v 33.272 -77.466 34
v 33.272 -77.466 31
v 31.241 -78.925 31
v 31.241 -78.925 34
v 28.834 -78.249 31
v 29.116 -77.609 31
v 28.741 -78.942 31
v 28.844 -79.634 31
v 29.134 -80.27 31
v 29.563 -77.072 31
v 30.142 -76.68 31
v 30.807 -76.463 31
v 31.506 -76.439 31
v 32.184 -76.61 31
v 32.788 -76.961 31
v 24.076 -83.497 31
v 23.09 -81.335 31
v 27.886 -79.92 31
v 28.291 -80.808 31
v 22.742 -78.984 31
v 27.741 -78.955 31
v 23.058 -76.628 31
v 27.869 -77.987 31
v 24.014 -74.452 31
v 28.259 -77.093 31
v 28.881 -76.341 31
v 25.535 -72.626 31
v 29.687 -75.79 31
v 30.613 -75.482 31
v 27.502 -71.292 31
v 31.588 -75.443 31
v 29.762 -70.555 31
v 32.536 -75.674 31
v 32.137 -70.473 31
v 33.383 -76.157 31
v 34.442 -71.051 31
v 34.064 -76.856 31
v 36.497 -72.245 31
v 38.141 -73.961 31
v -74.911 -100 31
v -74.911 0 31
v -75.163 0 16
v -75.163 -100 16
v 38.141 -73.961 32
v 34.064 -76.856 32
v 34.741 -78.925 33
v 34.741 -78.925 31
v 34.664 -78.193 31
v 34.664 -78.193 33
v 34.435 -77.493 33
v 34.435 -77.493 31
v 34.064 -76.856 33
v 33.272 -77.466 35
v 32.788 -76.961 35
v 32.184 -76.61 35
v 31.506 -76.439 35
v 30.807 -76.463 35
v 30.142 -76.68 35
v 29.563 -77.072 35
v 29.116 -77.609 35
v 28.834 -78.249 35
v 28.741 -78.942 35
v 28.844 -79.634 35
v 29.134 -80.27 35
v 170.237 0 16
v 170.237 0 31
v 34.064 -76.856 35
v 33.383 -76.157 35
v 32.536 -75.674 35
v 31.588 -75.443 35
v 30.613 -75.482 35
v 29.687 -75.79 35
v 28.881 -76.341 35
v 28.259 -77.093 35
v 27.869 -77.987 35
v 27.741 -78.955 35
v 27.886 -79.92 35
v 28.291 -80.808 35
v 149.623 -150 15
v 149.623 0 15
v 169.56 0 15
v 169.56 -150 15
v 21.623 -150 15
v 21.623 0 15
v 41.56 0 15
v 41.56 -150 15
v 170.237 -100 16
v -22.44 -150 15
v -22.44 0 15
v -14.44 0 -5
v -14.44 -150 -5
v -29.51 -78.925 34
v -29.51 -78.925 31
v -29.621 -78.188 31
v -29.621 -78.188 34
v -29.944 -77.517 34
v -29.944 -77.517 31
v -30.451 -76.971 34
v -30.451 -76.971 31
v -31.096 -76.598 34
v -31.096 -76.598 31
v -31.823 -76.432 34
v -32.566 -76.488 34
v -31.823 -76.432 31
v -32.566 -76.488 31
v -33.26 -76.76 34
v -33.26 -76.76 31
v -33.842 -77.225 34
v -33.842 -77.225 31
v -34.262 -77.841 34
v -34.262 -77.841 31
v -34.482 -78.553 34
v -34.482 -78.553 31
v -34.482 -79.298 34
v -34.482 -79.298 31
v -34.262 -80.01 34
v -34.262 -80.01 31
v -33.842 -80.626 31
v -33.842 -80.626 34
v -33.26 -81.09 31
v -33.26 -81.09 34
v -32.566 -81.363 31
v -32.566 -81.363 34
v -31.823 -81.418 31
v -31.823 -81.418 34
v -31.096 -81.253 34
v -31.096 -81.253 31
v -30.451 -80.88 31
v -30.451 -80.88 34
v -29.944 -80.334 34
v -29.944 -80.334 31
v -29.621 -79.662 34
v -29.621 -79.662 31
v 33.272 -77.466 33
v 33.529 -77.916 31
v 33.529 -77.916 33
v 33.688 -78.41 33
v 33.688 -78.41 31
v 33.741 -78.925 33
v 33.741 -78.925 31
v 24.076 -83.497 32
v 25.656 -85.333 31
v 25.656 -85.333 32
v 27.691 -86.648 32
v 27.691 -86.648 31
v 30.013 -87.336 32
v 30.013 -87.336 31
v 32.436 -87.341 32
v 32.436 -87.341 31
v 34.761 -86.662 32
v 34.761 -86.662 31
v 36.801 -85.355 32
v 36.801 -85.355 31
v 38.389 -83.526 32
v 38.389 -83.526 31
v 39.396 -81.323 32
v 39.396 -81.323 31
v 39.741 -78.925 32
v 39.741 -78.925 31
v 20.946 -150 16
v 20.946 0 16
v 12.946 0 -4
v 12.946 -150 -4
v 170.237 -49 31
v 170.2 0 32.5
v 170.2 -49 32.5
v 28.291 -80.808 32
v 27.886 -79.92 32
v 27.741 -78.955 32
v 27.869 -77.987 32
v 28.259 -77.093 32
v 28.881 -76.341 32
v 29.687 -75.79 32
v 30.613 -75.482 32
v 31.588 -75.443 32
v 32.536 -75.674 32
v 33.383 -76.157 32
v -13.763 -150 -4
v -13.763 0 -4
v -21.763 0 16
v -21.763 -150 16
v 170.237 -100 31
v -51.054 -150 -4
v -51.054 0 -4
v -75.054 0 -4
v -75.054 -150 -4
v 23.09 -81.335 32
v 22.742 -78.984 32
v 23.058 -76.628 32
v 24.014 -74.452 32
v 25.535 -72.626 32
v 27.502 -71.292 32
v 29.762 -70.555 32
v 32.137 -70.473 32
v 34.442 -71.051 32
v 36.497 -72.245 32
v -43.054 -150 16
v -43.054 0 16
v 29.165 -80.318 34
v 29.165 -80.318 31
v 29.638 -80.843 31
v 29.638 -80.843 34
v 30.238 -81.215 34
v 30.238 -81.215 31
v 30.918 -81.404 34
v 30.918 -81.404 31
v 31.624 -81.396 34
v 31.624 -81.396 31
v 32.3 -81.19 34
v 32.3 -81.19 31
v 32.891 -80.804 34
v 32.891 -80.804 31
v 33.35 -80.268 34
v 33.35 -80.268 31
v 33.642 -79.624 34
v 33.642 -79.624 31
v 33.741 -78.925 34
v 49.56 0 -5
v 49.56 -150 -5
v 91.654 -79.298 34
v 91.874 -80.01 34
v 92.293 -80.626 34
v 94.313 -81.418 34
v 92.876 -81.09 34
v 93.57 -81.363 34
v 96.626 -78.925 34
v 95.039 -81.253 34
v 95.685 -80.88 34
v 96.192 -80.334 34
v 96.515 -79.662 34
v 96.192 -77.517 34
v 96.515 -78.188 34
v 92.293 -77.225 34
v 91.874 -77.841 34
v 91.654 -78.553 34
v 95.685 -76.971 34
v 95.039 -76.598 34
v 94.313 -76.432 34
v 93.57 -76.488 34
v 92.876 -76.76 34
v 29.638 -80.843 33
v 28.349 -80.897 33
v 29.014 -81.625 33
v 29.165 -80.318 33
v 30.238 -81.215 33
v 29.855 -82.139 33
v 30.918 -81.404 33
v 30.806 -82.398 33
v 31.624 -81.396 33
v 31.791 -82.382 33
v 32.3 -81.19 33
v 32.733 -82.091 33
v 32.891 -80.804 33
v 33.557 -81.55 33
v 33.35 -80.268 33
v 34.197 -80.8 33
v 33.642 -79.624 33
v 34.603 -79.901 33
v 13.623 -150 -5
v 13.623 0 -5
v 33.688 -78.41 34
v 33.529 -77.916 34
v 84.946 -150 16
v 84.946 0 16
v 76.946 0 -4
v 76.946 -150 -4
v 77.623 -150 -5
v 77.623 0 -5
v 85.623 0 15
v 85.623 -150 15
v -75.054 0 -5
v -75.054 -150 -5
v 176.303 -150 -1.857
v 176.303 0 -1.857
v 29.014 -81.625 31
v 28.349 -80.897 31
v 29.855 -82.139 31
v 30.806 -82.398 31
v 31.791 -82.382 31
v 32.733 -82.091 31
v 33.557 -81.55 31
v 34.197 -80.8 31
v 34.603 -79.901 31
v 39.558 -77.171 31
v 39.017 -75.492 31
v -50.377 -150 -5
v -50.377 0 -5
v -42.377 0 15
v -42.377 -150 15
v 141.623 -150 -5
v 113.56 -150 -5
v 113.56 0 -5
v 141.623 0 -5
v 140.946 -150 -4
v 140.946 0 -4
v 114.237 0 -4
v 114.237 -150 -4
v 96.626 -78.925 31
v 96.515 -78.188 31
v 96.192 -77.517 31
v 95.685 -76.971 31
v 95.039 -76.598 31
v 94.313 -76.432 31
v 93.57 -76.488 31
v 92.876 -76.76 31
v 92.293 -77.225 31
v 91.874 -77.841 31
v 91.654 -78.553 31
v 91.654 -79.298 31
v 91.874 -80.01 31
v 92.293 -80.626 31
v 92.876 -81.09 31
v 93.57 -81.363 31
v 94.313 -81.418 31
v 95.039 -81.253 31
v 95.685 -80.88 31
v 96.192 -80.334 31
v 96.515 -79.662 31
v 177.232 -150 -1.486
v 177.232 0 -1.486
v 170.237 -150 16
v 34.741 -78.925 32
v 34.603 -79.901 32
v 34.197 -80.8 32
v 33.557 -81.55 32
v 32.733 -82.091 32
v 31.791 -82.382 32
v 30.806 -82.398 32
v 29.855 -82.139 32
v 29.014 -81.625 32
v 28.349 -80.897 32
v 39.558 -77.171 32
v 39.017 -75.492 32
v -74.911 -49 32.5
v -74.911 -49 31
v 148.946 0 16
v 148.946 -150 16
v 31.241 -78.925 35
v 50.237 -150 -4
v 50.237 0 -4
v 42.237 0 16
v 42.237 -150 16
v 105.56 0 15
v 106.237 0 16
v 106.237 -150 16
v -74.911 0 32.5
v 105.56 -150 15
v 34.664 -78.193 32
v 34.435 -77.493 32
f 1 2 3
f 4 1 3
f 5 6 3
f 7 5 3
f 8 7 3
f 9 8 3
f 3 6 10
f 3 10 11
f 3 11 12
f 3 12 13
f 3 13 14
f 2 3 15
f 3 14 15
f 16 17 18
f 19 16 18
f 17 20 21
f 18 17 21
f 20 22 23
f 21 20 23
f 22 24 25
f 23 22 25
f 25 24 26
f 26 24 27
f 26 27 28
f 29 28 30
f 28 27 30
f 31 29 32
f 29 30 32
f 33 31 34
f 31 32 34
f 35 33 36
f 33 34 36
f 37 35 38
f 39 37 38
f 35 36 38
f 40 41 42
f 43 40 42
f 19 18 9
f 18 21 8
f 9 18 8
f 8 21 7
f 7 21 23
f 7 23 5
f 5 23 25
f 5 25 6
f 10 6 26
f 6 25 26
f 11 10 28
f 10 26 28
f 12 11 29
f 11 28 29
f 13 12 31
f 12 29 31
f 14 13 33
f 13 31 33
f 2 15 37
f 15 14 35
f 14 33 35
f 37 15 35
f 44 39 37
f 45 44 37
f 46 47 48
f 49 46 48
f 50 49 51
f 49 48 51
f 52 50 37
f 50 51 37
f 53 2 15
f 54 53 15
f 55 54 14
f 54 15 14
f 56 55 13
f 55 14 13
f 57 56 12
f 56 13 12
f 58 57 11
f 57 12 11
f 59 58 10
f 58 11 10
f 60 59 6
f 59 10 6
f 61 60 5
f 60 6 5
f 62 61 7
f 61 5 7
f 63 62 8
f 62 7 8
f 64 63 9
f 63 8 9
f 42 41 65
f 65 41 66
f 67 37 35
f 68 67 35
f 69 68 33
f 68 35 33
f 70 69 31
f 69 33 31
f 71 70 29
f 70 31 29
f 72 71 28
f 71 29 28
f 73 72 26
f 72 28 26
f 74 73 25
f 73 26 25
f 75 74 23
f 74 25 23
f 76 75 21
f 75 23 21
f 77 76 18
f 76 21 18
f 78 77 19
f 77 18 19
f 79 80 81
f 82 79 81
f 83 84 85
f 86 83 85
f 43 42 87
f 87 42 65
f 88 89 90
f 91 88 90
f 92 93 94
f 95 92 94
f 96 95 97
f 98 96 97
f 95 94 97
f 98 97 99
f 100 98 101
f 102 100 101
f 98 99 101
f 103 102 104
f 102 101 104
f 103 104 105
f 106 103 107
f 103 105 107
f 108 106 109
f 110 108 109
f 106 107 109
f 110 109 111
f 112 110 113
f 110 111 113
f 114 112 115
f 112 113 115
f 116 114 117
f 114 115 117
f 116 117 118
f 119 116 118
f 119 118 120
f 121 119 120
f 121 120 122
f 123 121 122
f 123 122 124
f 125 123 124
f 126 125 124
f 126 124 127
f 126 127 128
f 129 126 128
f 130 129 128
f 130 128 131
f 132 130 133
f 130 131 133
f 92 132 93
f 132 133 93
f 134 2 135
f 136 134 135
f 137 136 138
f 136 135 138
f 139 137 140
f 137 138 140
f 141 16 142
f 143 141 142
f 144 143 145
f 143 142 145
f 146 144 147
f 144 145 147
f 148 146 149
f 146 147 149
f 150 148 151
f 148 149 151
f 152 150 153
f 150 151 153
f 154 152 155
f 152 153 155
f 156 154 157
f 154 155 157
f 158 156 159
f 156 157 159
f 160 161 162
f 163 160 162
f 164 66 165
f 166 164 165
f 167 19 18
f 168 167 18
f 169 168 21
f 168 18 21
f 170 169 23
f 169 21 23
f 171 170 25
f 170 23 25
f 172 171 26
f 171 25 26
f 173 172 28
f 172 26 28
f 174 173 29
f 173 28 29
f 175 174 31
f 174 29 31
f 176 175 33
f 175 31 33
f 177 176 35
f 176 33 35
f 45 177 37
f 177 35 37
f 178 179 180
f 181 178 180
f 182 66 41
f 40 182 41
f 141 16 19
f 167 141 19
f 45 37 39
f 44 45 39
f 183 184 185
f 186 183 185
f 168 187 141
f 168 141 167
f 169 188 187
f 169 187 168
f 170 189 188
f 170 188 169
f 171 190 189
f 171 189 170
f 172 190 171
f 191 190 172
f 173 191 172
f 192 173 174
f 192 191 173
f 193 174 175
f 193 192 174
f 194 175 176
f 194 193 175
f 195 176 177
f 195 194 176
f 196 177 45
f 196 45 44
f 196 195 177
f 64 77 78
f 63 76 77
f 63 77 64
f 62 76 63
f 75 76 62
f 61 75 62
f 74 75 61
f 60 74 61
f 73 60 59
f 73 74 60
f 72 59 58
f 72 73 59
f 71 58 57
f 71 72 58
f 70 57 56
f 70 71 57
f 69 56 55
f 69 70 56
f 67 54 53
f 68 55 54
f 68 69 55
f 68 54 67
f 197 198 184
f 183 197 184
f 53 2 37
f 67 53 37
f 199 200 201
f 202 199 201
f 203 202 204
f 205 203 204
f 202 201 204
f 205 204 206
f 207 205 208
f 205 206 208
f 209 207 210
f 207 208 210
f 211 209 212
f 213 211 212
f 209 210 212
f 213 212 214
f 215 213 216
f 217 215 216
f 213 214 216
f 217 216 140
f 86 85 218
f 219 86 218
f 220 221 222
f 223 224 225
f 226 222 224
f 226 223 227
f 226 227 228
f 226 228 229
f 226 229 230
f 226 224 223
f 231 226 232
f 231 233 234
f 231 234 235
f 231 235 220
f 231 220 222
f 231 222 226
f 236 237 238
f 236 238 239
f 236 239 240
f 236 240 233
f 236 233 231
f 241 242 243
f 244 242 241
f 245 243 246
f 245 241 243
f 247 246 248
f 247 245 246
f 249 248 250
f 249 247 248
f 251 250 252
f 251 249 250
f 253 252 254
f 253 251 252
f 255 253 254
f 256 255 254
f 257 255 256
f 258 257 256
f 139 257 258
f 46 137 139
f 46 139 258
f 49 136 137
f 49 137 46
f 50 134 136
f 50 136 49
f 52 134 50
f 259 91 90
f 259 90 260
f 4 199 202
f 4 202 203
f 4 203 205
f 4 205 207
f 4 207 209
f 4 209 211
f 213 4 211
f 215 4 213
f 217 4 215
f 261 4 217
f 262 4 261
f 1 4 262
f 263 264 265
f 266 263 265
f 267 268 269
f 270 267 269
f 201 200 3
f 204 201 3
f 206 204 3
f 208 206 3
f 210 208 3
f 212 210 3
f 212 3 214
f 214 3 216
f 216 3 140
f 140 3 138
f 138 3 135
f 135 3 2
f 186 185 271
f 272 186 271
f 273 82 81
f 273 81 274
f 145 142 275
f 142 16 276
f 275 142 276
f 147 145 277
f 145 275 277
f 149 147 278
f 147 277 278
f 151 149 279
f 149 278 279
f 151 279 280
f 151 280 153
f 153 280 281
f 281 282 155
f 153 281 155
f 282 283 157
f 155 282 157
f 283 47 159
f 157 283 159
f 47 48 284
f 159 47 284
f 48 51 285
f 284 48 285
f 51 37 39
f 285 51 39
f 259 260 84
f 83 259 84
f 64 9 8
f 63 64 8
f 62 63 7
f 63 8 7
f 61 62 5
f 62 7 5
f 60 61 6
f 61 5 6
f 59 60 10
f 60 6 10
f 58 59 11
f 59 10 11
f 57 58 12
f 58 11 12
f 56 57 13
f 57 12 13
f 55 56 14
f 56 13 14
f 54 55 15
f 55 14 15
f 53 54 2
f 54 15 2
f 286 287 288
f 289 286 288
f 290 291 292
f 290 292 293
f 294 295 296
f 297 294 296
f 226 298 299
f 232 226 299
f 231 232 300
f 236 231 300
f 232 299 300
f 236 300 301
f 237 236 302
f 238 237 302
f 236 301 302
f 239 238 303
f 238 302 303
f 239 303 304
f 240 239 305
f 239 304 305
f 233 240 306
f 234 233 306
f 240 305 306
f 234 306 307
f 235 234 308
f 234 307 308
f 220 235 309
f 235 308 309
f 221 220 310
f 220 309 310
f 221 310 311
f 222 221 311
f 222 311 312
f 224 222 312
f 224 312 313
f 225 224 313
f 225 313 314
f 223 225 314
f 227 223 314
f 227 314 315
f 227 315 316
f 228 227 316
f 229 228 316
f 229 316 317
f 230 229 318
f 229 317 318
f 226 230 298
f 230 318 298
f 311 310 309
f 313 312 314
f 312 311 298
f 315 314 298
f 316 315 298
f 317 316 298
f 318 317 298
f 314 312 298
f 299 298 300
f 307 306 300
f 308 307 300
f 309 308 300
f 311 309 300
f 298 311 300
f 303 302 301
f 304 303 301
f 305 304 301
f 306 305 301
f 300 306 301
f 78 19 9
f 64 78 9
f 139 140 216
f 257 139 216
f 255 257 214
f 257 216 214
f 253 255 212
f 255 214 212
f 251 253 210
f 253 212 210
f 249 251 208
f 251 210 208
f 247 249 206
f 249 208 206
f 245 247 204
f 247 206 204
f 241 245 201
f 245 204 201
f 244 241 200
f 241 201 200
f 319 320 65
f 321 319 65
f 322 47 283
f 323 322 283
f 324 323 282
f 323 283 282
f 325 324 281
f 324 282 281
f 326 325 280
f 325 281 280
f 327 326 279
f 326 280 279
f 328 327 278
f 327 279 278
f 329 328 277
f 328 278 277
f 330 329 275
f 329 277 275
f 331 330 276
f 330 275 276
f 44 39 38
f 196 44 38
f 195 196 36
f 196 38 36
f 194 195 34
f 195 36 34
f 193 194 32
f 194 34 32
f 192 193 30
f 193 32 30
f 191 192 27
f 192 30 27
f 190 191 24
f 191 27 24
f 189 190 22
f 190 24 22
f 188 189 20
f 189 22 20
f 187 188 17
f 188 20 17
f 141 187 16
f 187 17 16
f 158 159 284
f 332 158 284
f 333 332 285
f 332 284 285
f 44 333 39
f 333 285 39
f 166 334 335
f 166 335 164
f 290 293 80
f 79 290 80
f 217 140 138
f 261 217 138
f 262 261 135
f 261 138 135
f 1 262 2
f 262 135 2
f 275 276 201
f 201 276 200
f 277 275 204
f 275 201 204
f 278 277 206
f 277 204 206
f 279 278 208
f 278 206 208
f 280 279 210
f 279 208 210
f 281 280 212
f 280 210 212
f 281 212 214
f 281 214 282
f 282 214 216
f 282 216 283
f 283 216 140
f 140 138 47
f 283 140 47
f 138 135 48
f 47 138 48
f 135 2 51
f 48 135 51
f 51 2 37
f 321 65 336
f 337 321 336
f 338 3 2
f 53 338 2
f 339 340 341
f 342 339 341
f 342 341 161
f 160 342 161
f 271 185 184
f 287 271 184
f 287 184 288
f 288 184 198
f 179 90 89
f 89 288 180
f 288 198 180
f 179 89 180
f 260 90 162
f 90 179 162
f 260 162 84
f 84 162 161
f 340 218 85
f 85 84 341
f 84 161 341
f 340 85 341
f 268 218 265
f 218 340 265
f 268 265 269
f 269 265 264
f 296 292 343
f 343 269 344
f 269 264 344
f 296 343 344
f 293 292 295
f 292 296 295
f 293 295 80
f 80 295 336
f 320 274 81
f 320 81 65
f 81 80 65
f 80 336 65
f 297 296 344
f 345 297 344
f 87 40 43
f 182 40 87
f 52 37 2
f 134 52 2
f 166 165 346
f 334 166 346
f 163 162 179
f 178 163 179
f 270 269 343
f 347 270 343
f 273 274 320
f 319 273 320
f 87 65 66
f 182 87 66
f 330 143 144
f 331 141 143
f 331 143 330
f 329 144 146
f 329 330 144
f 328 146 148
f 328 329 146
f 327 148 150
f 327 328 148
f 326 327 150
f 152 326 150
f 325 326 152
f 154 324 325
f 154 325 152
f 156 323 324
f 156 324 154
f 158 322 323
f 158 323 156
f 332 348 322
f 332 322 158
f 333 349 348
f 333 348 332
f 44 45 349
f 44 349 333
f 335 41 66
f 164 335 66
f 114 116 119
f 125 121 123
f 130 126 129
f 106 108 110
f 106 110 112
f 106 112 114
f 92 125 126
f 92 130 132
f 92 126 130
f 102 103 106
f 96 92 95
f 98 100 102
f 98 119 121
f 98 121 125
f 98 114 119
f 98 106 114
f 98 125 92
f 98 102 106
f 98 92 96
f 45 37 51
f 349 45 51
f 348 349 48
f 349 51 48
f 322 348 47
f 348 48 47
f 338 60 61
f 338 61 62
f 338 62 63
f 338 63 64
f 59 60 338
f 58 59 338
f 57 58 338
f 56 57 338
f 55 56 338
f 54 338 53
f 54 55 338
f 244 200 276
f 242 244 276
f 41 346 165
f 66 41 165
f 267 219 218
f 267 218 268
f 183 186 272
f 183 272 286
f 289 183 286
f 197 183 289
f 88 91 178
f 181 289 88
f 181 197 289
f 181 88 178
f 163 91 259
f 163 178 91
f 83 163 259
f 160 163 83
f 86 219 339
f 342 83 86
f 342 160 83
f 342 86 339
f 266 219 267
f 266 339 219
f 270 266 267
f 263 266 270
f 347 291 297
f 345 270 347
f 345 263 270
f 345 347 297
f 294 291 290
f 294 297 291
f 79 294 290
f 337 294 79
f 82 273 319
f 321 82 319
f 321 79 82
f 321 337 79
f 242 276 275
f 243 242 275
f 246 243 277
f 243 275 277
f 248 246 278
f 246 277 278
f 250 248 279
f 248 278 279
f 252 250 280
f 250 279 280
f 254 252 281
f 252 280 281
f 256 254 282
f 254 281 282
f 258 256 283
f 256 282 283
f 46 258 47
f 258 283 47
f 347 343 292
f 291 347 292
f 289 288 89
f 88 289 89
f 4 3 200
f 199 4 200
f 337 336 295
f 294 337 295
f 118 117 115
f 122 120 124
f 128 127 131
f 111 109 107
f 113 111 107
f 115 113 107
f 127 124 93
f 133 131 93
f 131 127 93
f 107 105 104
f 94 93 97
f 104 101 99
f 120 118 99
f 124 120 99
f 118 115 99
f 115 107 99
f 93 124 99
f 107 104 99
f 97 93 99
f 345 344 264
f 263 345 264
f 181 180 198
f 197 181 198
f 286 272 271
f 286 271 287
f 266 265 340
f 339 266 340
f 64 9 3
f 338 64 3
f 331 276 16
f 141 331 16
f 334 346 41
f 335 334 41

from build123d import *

# Parameters (mm, degrees)
F1_DEPTH  = 150
F2_DEPTH  = 100
F3_DEPTH  = 49
F4_R      = 2.5
F5_DEPTH  = 3
F6_DEPTH  = 3
F7_DEPTH  = 3
F8_DEPTH  = 4
F9_DEPTH  = 4
F10_DEPTH = 2
F11_DEPTH = 1
F12_DEPTH = 1


with BuildPart() as f1:
    # F0 (on Front) → F1 (new body)
    with BuildSketch(Plane.XZ):
        Polygon((-51.054478, -4), (-75.054478, -4), (-75.054478, -5), (-50.377445, -5), (-42.377445, 15), (-22.439643, 15), (-14.439643, -5), (13.622555, -5), (21.622555, 15), (41.560357, 15), (49.560357, -5), (77.622555, -5), (85.622555, 15), (105.560357, 15), (113.560357, -5), (141.622555, -5), (149.622555, 15), (169.560357, 15), (176.303139, -1.856953), (177.231616, -1.485563), (170.23739, 16), (148.945522, 16), (140.945522, -4), (114.23739, -4), (106.23739, 16), (84.945522, 16), (76.945522, -4), (50.23739, -4), (42.23739, 16), (20.945522, 16), (12.945522, -4), (-13.76261, -4), (-21.76261, 16), (-43.054478, 16), align=None)
    extrude(amount=F1_DEPTH)


with BuildPart() as f2:
    # F0 (on Front) → F2 (new body)
    with BuildSketch(Plane.XZ):
        Polygon((-75.163431, 16), (-43.054478, 16), (-21.76261, 16), (20.945522, 16), (42.23739, 16), (84.945522, 16), (106.23739, 16), (148.945522, 16), (170.23739, 16), (170.23739, 31), (-74.911438, 31), align=None)
    extrude(amount=F2_DEPTH)


with BuildPart() as f3:
    # F0 (on Front) → F3 (new body)
    with BuildSketch(Plane.XZ):
        Polygon((-74.911438, 32.499531), (-74.911438, 31), (170.23739, 31), (170.199873, 32.499531), align=None)
    extrude(amount=F3_DEPTH)


with BuildPart() as f5:
    # F4 (on face) → F5 (new body)
    with BuildSketch(Plane.XY.offset(31)):
        with Locations((94.12609, -78.925343)):
            Circle(F4_R)
    extrude(amount=F5_DEPTH)


with BuildPart() as f6:
    # F4 (on face) → F6 (new body)
    with BuildSketch(Plane.XY.offset(31)):
        with Locations((-32.009708, -78.925343)):
            Circle(F4_R)
    extrude(amount=F6_DEPTH)


with BuildPart() as f7:
    # F4 (on face) → F7 (new body)
    with BuildSketch(Plane.XY.offset(31)):
        with BuildLine():
            ThreePointArc((29.16524, -80.318087), (31.969267, -81.317026), (33.741357, -78.925343))
            ThreePointArc((33.741357, -78.925343), (33.620999, -78.158986), (33.271515, -77.466419))
            Line((33.271515, -77.466419), (31.241357, -78.925343))
            Line((31.241357, -78.925343), (29.16524, -80.318087))
        make_face()
    extrude(amount=F7_DEPTH)


with BuildPart() as f8:
    # F4 (on face) → F8 (new body)
    with BuildSketch(Plane.XY.offset(31)):
        with BuildLine():
            Line((31.241357, -78.925343), (33.271515, -77.466419))
            ThreePointArc((33.271515, -77.466419), (29.838999, -76.855707), (29.133819, -80.270068))
            Line((29.133819, -80.270068), (31.241357, -78.925343))
        make_face()
    extrude(amount=F8_DEPTH)


with BuildPart() as f9:
    # F4 (on face) → F9 (new body)
    with BuildSketch(Plane.XY.offset(31)):
        with BuildLine():
            ThreePointArc((29.133819, -80.270068), (29.838999, -76.855707), (33.271515, -77.466419))
            Line((33.271515, -77.466419), (34.064402, -76.856425))
            ThreePointArc((34.064402, -76.856425), (29.264563, -76.037042), (28.290804, -80.807958))
            Line((28.290804, -80.807958), (29.133819, -80.270068))
        make_face()
    extrude(amount=F9_DEPTH)


with BuildPart() as f10:
    # F4 (on face) → F10 (new body)
    with BuildSketch(Plane.XY.offset(31)):
        with BuildLine():
            ThreePointArc((33.271515, -77.466419), (33.620999, -78.158986), (33.741357, -78.925343))
            ThreePointArc((33.741357, -78.925343), (31.969267, -81.317026), (29.16524, -80.318087))
            Line((29.16524, -80.318087), (28.349255, -80.896573))
            ThreePointArc((28.349255, -80.896573), (32.272775, -82.269917), (34.741357, -78.925343))
            ThreePointArc((34.741357, -78.925343), (34.567816, -77.836916), (34.064402, -76.856425))
            Line((34.064402, -76.856425), (33.271515, -77.466419))
        make_face()
    extrude(amount=F10_DEPTH)


with BuildPart() as f11:
    # F4 (on face) → F11 (new body)
    with BuildSketch(Plane.XY.offset(31)):
        with BuildLine():
            ThreePointArc((28.290804, -80.807958), (29.264563, -76.037042), (34.064402, -76.856425))
            Line((34.064402, -76.856425), (38.141315, -73.961415))
            ThreePointArc((38.141315, -73.961415), (26.471511, -71.889821), (24.075729, -83.497407))
            Line((24.075729, -83.497407), (28.290804, -80.807958))
        make_face()
    extrude(amount=F11_DEPTH)


with BuildPart() as f12:
    # F4 (on face) → F12 (new body)
    with BuildSketch(Plane.XY.offset(31)):
        with BuildLine():
            Line((38.141315, -73.961415), (34.064402, -76.856425))
            ThreePointArc((34.064402, -76.856425), (34.567816, -77.836916), (34.741357, -78.925343))
            ThreePointArc((34.741357, -78.925343), (32.272775, -82.269917), (28.349255, -80.896573))
            Line((28.349255, -80.896573), (24.075729, -83.497407))
            ThreePointArc((24.075729, -83.497407), (33.62276, -87.084933), (39.741357, -78.925343))
            ThreePointArc((39.741357, -78.925343), (39.331464, -76.317628), (38.141315, -73.961415))
        make_face()
    extrude(amount=F12_DEPTH)


solid = Compound([f1.part, f2.part, f3.part, f5.part, f6.part, f7.part, f8.part, f9.part, f10.part, f11.part, f12.part])
